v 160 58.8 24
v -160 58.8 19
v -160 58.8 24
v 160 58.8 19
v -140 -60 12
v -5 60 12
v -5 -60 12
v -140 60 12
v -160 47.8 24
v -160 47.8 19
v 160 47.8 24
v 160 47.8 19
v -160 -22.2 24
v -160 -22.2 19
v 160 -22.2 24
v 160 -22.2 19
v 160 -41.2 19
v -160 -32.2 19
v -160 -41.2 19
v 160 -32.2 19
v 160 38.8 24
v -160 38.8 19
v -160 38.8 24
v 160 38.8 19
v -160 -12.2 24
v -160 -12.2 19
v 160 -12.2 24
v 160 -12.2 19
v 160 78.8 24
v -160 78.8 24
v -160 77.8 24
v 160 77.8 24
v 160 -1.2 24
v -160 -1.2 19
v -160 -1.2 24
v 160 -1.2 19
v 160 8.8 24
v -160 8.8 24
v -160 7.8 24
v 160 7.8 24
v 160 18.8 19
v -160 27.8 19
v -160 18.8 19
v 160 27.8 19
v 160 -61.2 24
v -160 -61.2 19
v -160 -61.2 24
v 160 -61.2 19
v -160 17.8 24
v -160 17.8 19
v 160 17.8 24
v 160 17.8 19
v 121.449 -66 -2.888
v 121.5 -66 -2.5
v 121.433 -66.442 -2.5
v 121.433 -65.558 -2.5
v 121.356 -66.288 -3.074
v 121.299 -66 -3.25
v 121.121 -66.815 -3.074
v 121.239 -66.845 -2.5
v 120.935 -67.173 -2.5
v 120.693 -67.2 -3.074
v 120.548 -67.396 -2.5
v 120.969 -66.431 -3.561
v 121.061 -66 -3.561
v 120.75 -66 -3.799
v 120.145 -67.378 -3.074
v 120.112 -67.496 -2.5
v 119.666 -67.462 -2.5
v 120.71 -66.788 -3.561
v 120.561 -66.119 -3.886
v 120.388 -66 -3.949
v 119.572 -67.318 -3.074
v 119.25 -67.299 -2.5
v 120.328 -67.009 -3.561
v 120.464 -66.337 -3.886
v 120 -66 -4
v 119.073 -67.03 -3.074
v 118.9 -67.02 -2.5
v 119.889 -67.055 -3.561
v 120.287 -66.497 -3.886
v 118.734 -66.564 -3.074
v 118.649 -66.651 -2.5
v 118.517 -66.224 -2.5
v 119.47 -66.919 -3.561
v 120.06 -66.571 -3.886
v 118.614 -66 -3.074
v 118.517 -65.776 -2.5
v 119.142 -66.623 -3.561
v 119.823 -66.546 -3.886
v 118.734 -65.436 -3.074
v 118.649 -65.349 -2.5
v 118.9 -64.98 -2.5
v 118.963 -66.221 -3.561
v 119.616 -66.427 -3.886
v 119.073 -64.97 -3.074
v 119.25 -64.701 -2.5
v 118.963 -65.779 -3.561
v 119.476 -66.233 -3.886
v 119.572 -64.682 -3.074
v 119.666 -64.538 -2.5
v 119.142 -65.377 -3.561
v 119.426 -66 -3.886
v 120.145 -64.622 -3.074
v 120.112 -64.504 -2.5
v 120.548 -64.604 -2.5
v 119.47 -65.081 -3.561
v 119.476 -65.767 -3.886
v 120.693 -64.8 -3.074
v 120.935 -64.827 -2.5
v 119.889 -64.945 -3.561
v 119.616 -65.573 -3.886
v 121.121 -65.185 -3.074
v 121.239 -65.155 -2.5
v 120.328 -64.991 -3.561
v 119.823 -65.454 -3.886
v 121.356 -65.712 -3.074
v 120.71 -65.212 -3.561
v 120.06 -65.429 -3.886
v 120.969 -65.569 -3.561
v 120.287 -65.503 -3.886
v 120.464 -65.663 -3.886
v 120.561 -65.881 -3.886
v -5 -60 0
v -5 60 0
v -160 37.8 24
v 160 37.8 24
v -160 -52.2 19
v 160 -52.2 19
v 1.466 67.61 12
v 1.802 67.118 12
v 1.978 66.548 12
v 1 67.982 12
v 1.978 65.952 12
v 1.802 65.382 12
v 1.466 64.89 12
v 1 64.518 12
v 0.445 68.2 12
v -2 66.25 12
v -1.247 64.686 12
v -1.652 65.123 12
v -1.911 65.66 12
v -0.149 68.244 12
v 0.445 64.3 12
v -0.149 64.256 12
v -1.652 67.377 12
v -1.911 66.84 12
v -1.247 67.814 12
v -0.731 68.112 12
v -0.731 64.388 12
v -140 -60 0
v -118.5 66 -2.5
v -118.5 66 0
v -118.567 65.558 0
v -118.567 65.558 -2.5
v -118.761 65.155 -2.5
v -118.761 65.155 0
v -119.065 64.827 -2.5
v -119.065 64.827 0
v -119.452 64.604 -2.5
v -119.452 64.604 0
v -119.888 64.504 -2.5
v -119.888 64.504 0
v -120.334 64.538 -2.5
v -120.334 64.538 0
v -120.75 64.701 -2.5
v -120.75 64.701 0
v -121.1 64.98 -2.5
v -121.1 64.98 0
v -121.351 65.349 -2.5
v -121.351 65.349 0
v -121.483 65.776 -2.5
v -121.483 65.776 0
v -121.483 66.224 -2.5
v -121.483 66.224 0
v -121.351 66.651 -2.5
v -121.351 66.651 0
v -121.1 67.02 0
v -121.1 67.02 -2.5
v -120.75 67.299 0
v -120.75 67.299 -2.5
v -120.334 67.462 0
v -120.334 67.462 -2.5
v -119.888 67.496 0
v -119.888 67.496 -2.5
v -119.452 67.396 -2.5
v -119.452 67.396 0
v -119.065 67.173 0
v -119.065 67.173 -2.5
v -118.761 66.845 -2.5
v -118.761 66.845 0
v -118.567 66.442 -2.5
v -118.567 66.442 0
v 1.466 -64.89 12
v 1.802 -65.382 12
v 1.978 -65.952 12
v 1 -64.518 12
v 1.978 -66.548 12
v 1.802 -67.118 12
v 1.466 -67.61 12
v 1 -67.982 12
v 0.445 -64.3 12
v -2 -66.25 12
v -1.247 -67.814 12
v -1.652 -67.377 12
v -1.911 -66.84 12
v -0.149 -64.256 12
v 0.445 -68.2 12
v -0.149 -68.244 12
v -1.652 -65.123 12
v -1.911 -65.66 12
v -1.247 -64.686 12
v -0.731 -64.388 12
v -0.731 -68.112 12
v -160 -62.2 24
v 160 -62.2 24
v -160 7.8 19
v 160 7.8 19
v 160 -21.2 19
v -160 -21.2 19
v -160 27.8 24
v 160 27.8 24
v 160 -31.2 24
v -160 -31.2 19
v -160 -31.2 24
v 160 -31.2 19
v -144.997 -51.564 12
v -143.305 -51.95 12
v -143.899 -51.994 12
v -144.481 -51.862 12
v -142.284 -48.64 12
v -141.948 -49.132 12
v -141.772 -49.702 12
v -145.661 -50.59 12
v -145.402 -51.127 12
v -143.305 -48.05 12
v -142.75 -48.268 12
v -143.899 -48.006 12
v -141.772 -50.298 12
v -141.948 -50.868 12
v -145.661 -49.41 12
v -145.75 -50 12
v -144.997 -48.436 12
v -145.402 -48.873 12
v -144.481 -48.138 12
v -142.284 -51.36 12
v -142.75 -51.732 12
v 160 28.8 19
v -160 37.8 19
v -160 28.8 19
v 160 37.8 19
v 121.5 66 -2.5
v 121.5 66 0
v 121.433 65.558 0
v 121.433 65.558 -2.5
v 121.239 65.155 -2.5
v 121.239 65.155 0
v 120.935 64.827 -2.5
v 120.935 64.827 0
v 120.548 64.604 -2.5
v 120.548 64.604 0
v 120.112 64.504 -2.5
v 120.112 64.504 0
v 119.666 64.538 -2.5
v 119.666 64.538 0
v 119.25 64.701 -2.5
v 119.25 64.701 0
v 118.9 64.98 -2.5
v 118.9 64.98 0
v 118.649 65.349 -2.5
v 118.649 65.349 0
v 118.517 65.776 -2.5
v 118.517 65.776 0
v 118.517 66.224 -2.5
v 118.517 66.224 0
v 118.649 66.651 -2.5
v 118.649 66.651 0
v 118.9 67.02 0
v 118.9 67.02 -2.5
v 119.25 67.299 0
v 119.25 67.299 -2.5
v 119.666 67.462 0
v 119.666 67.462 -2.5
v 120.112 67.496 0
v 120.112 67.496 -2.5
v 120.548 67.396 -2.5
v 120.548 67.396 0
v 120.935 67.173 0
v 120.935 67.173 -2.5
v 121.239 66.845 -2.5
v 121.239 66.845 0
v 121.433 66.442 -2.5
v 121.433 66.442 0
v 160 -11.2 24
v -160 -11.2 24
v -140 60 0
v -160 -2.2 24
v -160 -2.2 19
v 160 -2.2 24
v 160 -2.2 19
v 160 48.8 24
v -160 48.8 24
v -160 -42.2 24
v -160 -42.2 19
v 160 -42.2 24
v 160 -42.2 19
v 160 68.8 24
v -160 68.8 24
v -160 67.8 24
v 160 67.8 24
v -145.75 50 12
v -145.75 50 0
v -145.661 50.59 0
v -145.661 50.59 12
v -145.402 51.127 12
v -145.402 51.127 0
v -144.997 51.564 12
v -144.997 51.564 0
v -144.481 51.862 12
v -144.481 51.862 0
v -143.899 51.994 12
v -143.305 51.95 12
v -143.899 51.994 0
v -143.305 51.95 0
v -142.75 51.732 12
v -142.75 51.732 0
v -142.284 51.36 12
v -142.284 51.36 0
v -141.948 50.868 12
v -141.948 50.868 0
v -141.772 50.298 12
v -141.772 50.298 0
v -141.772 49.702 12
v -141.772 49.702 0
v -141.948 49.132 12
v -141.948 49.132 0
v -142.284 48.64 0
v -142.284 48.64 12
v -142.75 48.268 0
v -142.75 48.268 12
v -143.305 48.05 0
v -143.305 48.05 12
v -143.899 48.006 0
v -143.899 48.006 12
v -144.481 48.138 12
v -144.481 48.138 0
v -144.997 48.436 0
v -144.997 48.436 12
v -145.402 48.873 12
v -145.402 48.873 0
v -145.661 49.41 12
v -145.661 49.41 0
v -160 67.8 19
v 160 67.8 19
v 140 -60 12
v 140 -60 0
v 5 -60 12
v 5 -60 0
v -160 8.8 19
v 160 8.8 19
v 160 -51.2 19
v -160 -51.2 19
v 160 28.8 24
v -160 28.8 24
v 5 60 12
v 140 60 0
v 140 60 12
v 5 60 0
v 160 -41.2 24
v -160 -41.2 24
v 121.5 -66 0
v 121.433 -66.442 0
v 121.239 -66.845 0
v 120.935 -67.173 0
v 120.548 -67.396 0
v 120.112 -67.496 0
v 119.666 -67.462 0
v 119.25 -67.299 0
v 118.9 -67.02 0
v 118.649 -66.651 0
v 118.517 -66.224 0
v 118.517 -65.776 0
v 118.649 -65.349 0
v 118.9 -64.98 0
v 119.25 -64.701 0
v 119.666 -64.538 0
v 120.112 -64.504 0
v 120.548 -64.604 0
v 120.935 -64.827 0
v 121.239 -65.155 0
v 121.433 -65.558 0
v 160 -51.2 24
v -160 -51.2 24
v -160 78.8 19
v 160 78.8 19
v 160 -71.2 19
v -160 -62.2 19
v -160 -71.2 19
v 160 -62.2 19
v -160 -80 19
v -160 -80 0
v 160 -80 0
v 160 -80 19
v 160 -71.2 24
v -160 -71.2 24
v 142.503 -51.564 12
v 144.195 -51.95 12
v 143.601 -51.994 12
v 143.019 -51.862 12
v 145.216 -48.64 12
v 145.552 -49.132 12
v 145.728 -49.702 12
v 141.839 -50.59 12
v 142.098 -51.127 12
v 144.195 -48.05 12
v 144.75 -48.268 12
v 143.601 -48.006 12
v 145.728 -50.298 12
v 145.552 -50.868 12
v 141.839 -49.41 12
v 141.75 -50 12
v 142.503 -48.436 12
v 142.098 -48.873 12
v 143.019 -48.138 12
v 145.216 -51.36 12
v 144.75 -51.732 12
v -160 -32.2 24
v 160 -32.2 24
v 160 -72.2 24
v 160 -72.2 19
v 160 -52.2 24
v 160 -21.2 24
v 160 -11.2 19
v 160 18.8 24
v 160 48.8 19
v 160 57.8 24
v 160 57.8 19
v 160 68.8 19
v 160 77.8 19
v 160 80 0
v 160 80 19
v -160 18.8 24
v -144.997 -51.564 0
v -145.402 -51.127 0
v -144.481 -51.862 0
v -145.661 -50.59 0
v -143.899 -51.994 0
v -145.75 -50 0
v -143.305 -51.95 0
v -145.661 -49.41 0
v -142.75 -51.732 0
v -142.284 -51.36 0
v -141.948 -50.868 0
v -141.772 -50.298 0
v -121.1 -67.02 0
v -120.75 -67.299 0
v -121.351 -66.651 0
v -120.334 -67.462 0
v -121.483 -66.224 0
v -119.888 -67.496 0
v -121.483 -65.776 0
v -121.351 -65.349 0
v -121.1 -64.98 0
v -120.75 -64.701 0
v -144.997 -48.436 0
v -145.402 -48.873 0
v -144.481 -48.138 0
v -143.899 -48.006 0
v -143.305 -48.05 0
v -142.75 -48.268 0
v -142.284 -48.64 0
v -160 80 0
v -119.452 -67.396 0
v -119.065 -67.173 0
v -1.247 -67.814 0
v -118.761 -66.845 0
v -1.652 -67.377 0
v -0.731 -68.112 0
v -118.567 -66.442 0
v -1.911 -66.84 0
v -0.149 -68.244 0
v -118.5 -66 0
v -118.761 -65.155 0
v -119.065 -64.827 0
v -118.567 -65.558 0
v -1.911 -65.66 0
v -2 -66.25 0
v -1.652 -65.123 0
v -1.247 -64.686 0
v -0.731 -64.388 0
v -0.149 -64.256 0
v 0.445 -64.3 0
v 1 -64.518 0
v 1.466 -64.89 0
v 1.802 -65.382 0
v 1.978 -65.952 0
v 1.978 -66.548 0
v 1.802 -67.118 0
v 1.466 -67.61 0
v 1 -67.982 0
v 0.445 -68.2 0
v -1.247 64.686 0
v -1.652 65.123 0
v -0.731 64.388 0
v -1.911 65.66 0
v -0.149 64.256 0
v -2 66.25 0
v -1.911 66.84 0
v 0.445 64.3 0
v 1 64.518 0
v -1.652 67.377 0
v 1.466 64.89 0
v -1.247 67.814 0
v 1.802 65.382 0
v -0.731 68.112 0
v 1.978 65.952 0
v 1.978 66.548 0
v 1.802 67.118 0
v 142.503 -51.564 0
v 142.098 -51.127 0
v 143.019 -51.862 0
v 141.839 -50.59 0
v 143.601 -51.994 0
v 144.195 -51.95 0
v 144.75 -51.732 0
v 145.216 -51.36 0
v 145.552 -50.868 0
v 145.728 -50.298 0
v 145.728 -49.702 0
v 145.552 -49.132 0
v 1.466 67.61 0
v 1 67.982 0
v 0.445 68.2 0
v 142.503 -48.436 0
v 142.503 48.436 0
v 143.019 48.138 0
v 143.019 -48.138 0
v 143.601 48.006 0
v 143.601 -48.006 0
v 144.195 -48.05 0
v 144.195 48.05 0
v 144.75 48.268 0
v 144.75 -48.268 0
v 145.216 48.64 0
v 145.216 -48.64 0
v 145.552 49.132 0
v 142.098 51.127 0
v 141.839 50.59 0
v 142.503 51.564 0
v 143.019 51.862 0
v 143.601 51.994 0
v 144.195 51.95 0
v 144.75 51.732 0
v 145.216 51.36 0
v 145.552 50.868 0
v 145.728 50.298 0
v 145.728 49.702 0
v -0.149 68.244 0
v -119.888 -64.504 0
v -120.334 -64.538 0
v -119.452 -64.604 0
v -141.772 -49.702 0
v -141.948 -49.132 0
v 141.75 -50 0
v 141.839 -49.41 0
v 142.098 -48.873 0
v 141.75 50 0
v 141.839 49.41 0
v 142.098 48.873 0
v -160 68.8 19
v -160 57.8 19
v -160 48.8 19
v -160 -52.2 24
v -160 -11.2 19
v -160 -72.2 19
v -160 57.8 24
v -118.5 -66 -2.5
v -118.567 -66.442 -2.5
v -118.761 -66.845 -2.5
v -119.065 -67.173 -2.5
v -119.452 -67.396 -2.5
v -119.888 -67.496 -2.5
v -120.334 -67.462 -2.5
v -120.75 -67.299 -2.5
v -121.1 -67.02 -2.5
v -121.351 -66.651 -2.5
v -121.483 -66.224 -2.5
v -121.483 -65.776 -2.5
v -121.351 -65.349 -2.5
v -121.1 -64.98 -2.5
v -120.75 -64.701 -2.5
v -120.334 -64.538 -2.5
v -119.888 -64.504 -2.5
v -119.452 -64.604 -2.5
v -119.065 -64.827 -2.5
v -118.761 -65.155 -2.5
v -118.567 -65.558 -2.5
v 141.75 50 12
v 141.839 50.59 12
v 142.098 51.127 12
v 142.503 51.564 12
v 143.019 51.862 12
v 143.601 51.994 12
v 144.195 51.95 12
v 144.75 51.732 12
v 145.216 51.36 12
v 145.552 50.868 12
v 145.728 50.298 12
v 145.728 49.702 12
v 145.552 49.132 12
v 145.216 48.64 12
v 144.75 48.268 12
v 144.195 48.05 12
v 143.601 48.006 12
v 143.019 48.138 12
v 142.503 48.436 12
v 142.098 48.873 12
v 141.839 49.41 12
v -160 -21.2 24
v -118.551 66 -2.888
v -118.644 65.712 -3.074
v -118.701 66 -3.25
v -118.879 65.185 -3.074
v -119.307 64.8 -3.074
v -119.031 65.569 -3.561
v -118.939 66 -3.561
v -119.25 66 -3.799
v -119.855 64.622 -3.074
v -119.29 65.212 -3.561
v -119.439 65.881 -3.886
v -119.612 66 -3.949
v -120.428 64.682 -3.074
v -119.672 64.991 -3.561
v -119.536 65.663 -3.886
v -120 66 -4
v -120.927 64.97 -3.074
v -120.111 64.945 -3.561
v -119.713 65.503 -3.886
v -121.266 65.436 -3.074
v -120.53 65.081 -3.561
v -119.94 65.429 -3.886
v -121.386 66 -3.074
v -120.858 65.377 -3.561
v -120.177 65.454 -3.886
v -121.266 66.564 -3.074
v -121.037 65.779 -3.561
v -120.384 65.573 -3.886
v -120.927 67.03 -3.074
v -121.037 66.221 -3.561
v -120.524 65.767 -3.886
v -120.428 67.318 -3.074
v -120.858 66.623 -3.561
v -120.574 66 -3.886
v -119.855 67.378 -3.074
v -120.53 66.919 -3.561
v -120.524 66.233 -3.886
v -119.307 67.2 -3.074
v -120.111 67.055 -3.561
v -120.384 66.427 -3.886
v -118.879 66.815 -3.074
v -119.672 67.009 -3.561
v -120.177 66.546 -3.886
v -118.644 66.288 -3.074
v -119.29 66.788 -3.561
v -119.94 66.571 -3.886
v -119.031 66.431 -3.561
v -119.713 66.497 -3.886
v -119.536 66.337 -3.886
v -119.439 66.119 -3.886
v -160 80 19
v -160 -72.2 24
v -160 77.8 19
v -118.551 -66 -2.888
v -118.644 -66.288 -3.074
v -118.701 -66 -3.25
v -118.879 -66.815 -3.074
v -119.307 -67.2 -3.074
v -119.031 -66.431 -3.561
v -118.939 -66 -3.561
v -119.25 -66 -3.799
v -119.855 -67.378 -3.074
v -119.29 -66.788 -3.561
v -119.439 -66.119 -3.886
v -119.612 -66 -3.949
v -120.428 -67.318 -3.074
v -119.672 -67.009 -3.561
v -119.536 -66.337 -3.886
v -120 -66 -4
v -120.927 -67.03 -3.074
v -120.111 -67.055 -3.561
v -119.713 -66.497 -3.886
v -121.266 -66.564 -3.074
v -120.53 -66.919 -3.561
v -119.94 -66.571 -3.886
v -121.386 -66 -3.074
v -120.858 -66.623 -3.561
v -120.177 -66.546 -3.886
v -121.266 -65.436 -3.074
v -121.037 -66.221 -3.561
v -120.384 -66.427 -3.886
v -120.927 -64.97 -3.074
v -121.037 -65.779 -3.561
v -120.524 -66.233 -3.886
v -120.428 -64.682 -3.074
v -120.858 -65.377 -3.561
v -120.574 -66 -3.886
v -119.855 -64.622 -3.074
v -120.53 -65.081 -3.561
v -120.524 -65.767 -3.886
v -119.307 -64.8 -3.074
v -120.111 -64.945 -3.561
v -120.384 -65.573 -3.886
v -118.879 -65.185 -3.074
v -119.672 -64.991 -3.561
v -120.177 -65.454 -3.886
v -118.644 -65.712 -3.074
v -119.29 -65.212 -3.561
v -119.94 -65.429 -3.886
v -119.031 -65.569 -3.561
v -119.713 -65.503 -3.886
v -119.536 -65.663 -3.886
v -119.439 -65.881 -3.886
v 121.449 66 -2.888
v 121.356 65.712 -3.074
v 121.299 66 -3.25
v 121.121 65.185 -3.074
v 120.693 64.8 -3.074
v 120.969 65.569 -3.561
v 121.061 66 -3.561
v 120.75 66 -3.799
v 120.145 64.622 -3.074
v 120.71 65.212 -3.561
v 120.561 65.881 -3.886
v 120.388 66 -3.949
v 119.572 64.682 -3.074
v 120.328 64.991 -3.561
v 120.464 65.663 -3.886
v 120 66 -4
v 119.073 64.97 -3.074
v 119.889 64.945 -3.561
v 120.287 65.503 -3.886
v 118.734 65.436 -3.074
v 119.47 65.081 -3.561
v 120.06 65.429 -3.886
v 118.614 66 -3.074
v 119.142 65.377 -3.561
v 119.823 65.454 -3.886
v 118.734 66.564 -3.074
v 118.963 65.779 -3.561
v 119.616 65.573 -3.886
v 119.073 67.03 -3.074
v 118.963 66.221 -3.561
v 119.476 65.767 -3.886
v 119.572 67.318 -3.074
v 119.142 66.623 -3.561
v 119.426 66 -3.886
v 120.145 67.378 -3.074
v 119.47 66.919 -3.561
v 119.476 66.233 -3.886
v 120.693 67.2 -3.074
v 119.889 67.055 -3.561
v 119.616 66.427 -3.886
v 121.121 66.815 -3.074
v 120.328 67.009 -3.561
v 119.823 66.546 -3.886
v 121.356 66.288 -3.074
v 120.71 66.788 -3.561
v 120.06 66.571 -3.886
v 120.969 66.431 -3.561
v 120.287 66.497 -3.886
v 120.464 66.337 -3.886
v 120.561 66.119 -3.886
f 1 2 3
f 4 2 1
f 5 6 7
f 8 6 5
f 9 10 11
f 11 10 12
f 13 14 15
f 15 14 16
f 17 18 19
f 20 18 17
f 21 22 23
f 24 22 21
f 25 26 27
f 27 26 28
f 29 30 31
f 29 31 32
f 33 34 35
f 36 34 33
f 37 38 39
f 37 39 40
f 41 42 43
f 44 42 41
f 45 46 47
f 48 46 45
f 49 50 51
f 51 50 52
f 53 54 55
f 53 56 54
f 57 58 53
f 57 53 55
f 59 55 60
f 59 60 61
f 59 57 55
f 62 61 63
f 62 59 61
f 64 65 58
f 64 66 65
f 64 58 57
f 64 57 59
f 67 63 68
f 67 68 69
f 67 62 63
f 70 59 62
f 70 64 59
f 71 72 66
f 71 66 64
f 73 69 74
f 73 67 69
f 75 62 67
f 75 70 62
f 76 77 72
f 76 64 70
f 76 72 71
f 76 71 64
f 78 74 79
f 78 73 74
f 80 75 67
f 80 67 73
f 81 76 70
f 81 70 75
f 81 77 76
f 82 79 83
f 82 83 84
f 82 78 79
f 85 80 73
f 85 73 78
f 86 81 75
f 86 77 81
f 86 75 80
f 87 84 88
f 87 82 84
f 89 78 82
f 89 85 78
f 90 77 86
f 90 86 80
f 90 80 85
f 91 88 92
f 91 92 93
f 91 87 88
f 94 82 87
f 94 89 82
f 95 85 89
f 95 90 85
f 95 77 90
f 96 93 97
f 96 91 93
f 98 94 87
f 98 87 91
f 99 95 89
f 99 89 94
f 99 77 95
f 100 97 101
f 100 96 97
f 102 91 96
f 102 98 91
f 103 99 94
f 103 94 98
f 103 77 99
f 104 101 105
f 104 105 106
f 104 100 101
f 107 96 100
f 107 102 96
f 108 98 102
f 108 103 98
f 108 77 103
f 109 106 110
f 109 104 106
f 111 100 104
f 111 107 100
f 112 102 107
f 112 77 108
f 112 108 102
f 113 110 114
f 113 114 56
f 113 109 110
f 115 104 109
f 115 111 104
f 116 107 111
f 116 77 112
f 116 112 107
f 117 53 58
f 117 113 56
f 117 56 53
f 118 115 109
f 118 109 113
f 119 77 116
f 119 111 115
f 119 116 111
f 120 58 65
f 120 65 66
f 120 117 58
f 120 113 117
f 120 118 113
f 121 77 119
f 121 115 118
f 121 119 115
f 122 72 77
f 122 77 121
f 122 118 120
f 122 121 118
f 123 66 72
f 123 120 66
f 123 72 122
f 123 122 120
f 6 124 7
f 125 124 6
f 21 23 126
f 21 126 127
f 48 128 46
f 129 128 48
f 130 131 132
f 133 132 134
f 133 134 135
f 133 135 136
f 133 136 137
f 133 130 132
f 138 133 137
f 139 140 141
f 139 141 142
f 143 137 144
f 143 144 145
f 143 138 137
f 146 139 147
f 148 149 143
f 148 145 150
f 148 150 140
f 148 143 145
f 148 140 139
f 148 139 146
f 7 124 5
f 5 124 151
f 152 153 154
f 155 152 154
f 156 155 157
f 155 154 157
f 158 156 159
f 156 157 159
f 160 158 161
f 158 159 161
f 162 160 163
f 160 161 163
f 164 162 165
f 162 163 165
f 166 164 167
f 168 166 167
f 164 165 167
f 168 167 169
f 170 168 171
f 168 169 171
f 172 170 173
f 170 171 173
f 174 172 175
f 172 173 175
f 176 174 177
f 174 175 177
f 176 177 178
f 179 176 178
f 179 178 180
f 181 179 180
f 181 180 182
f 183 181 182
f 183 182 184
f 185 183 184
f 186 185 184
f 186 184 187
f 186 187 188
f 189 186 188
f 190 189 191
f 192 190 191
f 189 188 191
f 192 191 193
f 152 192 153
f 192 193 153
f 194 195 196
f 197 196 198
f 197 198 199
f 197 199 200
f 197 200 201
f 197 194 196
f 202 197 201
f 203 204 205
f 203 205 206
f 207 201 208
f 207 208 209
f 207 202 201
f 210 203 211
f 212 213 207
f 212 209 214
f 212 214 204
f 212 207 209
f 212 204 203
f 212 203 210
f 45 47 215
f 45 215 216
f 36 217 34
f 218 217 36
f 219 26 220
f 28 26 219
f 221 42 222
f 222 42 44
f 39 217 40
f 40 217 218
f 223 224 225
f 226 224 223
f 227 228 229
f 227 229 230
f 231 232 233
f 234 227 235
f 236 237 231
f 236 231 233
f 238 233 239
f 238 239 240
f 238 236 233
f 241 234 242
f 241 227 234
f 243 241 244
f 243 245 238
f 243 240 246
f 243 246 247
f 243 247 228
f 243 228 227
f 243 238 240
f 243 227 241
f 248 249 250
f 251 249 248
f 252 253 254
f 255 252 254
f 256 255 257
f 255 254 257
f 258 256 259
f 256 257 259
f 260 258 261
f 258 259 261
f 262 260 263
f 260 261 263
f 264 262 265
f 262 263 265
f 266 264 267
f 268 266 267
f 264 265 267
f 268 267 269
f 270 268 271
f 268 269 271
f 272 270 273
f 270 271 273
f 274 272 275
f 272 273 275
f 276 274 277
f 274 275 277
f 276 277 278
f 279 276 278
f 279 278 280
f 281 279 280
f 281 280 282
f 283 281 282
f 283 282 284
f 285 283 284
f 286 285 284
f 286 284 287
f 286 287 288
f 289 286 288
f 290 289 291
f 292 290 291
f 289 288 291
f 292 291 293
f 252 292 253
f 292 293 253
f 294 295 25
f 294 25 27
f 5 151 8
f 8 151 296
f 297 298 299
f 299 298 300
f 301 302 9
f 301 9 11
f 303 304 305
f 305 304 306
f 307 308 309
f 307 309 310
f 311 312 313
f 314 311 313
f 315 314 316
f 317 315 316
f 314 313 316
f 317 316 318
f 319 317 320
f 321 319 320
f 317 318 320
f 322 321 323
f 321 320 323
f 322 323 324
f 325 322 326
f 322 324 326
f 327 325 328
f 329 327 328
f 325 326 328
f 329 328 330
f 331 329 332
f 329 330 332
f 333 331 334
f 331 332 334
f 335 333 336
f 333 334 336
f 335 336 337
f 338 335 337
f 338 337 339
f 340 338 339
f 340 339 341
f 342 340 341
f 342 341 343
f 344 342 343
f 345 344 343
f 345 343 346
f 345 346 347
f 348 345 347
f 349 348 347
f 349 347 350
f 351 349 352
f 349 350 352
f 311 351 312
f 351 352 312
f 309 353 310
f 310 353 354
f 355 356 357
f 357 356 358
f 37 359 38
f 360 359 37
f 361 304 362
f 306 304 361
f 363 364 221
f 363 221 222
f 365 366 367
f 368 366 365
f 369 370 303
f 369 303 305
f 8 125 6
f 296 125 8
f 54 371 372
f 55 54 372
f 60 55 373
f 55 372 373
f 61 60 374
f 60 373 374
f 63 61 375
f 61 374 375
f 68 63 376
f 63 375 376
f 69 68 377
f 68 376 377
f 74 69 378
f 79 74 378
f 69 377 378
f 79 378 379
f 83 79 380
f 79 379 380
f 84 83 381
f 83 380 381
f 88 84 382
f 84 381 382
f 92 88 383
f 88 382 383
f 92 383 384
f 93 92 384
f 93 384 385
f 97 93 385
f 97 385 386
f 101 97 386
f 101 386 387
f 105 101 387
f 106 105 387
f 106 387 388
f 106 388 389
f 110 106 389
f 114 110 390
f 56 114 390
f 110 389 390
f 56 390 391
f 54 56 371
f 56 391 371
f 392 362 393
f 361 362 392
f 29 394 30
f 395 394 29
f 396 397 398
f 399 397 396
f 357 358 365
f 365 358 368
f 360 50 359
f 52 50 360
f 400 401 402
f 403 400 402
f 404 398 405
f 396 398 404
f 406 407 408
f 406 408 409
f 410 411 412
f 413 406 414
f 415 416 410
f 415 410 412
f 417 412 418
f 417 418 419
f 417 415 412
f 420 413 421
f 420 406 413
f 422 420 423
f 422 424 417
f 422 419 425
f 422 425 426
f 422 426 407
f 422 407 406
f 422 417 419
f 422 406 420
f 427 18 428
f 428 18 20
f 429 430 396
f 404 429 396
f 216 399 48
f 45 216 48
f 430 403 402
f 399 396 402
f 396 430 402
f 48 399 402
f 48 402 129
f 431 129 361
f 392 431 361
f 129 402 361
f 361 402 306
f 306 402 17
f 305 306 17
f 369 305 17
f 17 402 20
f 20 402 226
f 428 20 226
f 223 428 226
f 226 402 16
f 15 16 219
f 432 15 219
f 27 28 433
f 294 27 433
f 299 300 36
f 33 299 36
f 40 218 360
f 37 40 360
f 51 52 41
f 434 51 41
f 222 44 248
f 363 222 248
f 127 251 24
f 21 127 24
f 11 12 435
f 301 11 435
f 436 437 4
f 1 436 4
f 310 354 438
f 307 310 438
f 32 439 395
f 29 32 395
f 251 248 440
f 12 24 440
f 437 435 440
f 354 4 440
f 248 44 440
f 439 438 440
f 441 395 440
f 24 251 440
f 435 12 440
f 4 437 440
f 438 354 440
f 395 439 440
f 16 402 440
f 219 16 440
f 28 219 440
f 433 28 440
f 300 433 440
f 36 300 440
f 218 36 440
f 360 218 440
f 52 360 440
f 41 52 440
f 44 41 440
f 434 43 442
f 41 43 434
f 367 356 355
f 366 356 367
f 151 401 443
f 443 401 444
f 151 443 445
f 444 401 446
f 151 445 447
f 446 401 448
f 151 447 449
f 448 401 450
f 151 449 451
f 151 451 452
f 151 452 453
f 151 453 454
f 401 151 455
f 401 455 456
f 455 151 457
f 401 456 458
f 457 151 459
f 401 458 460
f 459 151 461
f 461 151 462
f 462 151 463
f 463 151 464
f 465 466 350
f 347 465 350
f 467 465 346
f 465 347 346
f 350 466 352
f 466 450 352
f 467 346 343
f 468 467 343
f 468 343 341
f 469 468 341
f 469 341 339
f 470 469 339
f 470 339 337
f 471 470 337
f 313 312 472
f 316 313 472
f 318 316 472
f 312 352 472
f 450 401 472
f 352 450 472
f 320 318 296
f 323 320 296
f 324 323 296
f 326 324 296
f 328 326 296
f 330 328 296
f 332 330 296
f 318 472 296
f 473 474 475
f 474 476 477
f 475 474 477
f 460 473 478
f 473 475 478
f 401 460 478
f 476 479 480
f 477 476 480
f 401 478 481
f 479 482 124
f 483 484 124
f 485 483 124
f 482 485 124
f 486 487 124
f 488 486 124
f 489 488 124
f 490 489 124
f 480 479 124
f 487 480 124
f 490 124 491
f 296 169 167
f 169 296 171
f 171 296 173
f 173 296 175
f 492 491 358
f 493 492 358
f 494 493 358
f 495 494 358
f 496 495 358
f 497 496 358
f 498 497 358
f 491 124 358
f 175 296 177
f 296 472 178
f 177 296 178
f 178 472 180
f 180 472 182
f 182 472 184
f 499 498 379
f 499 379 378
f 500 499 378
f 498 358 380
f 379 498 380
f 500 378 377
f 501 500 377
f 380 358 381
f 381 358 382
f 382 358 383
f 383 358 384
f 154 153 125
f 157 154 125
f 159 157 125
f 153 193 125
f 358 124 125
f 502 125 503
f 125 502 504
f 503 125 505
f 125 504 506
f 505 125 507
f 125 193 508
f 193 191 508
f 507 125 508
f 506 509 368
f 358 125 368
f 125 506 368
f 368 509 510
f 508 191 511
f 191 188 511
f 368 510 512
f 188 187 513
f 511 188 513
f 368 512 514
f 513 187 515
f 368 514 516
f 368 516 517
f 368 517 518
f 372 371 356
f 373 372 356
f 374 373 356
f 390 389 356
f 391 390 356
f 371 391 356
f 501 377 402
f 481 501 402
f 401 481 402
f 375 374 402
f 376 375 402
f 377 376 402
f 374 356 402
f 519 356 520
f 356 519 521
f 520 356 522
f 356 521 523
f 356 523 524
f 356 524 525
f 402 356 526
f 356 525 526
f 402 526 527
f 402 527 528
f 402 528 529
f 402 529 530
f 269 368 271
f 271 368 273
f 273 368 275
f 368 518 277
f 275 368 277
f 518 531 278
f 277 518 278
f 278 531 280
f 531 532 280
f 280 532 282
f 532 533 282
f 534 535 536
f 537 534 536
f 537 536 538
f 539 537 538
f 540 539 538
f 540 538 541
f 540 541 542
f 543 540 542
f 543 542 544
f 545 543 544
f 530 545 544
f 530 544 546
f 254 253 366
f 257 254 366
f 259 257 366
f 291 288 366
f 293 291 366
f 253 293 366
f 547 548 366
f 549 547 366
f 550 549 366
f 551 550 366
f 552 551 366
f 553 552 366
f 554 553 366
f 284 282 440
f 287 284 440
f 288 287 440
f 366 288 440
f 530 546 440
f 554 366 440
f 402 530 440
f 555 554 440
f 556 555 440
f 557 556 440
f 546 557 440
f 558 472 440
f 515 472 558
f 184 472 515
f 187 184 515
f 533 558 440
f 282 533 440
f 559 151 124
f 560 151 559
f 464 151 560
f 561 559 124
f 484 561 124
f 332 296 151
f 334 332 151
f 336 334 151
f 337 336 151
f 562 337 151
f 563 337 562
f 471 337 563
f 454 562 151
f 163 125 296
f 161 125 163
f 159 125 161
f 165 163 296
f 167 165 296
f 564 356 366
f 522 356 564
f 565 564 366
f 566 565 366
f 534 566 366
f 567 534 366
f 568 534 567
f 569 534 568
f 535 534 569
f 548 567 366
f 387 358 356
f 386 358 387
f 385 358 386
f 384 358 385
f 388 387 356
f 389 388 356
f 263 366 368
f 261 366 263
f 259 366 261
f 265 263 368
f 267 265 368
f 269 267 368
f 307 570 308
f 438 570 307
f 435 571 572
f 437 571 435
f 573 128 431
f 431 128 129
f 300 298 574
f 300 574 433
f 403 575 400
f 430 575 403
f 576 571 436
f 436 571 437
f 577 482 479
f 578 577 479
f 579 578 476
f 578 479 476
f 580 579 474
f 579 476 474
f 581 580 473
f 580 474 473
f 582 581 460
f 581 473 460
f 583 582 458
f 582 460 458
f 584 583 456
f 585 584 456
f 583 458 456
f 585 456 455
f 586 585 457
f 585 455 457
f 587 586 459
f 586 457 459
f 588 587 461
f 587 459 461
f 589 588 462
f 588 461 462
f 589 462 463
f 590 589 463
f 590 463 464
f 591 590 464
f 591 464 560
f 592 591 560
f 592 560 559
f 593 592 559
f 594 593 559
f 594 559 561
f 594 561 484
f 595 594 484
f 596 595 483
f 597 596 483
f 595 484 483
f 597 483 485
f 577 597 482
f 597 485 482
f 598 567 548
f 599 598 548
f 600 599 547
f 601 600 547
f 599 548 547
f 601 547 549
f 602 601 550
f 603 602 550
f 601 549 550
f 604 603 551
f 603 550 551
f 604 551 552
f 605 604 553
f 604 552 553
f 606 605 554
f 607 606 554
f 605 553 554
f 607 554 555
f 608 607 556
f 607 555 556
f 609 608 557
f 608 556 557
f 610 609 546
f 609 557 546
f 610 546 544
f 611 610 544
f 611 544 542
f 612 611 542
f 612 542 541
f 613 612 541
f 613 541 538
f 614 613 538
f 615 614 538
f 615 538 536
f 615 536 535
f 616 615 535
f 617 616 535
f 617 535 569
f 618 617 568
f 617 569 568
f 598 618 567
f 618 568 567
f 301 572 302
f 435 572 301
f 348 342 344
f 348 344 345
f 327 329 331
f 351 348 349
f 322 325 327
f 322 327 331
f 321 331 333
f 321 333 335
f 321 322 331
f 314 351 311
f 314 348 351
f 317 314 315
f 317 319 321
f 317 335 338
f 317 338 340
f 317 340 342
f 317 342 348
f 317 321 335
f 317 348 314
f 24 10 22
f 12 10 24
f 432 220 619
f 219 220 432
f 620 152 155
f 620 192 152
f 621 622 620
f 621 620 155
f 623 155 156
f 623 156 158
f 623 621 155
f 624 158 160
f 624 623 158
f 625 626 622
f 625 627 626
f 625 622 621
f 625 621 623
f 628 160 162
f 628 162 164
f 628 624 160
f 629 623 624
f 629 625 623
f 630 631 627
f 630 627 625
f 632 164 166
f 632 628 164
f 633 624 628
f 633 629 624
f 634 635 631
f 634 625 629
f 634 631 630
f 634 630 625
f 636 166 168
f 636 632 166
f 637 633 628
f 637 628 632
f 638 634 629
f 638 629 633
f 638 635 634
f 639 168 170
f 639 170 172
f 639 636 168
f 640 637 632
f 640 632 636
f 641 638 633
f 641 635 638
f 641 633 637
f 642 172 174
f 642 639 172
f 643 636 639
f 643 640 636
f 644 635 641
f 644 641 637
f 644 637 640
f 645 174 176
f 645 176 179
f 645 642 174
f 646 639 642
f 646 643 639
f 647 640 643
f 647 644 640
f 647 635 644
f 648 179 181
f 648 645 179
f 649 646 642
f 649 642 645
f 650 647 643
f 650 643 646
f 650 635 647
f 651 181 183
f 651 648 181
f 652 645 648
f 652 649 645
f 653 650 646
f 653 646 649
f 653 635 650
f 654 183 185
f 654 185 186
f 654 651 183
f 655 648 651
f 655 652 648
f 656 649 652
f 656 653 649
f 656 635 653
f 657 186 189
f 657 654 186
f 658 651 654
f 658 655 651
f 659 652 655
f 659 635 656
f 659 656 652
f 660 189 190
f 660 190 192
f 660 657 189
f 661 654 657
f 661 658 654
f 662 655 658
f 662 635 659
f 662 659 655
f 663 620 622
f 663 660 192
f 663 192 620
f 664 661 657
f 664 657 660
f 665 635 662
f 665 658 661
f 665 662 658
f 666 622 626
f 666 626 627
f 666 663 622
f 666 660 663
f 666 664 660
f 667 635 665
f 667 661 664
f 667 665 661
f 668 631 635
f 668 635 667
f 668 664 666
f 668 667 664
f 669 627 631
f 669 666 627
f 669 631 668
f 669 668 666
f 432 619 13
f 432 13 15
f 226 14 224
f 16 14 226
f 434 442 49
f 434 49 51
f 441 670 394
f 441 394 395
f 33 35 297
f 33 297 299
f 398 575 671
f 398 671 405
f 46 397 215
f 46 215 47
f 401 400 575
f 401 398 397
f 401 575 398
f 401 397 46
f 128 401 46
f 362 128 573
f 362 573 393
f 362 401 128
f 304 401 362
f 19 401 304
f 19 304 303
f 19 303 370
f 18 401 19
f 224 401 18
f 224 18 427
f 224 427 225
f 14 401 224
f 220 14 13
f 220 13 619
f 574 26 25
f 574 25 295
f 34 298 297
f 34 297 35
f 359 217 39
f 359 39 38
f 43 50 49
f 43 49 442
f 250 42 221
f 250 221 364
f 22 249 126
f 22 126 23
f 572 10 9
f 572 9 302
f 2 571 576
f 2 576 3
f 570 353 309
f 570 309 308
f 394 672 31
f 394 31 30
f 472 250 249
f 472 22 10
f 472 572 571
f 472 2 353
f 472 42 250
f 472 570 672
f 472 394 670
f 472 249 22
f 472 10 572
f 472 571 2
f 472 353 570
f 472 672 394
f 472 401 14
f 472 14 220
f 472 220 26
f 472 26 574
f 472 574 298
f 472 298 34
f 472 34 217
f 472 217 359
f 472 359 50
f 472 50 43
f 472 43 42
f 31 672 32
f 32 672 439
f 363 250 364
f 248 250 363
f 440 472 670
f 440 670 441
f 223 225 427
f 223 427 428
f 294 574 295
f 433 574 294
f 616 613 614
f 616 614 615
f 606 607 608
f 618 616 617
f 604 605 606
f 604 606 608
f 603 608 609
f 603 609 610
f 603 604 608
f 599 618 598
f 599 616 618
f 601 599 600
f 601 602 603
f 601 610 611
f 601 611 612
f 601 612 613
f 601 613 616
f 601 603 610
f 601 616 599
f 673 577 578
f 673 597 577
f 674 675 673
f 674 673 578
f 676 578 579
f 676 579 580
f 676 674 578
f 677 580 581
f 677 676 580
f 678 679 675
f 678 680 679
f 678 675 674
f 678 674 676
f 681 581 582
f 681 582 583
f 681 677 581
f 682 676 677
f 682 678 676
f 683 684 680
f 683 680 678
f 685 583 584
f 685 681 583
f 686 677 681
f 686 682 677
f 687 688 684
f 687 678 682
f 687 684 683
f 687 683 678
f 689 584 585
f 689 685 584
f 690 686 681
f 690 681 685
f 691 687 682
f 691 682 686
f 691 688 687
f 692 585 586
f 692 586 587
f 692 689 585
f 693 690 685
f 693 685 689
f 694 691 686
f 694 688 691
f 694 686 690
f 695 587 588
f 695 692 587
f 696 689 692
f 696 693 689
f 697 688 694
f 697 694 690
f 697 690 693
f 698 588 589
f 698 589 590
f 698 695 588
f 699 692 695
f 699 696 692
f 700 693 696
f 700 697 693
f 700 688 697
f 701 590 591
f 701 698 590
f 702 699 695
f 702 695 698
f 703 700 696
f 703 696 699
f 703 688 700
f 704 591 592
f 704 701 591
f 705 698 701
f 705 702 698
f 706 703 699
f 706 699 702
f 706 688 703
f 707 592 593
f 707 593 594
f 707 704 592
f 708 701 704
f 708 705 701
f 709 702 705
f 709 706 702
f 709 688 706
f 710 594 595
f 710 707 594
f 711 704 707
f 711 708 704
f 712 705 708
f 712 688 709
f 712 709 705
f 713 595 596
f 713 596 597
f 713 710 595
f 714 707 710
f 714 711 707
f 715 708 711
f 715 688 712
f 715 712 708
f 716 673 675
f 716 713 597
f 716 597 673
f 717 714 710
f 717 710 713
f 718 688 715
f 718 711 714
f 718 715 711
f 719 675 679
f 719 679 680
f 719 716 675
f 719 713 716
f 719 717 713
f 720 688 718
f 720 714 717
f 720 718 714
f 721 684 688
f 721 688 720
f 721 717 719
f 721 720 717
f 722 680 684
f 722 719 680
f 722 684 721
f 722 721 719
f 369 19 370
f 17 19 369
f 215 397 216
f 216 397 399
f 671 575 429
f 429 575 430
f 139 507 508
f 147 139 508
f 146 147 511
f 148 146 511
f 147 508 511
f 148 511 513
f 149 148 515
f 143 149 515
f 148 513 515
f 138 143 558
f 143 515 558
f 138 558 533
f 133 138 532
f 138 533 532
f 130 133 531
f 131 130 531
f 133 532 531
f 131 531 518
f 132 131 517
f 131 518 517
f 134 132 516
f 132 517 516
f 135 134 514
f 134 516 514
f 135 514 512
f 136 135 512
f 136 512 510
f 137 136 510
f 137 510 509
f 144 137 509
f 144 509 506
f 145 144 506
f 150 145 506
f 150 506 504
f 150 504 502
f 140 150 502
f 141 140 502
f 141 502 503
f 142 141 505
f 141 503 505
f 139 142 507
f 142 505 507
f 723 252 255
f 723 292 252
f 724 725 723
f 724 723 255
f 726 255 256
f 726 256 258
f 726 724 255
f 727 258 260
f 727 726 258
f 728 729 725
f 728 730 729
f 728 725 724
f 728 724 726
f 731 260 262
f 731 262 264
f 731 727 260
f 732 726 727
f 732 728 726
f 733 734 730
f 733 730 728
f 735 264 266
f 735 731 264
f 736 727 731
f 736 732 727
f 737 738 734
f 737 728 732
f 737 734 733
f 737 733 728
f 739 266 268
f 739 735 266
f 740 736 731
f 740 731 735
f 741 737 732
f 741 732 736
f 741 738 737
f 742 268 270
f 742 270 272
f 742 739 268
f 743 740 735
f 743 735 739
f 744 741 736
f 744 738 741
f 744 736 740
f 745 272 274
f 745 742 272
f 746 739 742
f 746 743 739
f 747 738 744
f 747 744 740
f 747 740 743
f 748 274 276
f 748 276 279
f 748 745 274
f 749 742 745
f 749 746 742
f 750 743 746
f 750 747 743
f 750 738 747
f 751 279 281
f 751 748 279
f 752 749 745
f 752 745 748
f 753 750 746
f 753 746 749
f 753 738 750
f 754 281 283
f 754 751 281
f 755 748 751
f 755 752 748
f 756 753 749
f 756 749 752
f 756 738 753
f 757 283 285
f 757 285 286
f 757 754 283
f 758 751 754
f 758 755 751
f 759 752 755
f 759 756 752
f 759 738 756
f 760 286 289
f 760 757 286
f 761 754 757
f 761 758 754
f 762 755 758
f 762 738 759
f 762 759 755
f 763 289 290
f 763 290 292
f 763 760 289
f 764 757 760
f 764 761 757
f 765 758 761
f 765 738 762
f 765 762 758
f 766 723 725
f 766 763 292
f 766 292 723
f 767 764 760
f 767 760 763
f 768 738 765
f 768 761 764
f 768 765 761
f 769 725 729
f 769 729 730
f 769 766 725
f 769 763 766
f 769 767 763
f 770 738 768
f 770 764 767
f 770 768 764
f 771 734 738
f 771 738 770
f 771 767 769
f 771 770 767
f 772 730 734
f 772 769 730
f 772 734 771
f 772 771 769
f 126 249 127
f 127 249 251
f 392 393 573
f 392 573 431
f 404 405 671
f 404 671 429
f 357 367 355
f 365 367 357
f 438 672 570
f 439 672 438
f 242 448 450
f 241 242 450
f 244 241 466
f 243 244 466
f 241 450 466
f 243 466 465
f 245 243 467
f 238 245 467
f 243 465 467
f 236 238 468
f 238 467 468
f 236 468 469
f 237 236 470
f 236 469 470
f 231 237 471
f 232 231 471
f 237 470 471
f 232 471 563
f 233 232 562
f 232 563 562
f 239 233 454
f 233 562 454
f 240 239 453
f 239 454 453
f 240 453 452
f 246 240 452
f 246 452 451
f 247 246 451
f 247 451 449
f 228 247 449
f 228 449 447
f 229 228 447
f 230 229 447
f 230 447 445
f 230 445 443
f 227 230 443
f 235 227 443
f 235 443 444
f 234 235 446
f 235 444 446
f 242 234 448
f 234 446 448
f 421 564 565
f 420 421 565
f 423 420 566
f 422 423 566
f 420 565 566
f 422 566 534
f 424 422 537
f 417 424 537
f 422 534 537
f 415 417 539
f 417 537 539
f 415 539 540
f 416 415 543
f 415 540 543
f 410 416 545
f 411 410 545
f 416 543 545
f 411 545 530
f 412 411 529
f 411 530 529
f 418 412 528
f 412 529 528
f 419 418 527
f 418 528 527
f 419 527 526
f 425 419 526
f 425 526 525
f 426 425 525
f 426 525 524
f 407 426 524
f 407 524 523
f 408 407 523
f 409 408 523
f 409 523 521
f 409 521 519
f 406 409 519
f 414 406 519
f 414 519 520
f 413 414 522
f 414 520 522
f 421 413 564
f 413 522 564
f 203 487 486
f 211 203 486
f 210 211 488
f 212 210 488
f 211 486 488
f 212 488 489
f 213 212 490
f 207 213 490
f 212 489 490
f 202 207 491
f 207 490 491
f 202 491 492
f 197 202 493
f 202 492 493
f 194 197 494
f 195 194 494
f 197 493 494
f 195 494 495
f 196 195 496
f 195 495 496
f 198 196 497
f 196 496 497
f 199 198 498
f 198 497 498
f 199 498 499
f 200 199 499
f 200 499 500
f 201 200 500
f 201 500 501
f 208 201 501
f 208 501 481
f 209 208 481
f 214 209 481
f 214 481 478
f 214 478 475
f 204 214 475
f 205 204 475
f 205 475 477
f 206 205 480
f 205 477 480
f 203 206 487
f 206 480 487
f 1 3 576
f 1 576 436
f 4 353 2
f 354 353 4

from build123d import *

# Parameters (mm, degrees)
SKETCH1_W           = 320
SKETCH1_H           = 160
BOSS_EXTRUDE1_DEPTH = 19
SKETCH4_W           = 320
SKETCH4_H           = 1
BOSS_EXTRUDE4_DEPTH = 5
LPATTERN2_COUNT     = 16
LPATTERN2_PITCH     = 10
SKETCH5_W           = 135
SKETCH5_H           = 120
CUT_EXTRUDE1_DEPTH  = 12
SKETCH6_R           = 2
CUT_EXTRUDE2_DEPTH  = 12
SKETCH7_R           = 1.5
BOSS_EXTRUDE5_DEPTH = 4
FILLET2_R           = 1.5


with BuildPart() as part:
    # Sketch1 → Boss-Extrude1 (new body)
    with BuildSketch(Plane.XY):
        Rectangle(SKETCH1_W, SKETCH1_H)
    extrude(amount=BOSS_EXTRUDE1_DEPTH)

    # Sketch4 → Boss-Extrude4 (add)
    with BuildSketch(Plane.XY.offset(19)):
        with Locations((0, 78.3)):
            Rectangle(SKETCH4_W, SKETCH4_H)
    boss_extrude4 = extrude(amount=BOSS_EXTRUDE4_DEPTH)

    # LPattern2: Boss-Extrude4 ×16
    with Locations(*[(0, -i * LPATTERN2_PITCH, 0) for i in range(1, LPATTERN2_COUNT)]):
        add(boss_extrude4)

    # Sketch5 → Cut-Extrude1 (cut)
    with BuildSketch(Plane(origin=(0, 0, 0), x_dir=(-1, 0, 0), z_dir=(0, 0, -1))):
        with Locations((-72.5, 0)):
            Rectangle(SKETCH5_W, SKETCH5_H)
        with Locations((72.5, 0)):
            Rectangle(SKETCH5_W, SKETCH5_H)
    extrude(amount=-CUT_EXTRUDE1_DEPTH, mode=Mode.SUBTRACT)

    # Sketch6 → Cut-Extrude2 (cut)
    with BuildSketch(Plane(origin=(0, 0, 0), x_dir=(-1, 0, 0), z_dir=(0, 0, -1))):
        with Locations((-143.75, 50)):
            Circle(SKETCH6_R)
        with Locations((-143.75, -50)):
            Circle(SKETCH6_R)
        with Locations((0, 66.25)):
            Circle(SKETCH6_R)
        with Locations((143.75, 50)):
            Circle(SKETCH6_R)
        with Locations((143.75, -50)):
            Circle(SKETCH6_R)
        with Locations((0, -66.25)):
            Circle(SKETCH6_R)
    extrude(amount=-CUT_EXTRUDE2_DEPTH, mode=Mode.SUBTRACT)

    # Sketch7 → Boss-Extrude5 (add)
    with BuildSketch(Plane(origin=(0, 0, 0), x_dir=(-1, 0, 0), z_dir=(0, 0, -1))):
        with Locations(Location((-120, 66, 0), (0, 0, 180))):
            Circle(SKETCH7_R)
        with Locations(Location((120, 66, 0), (0, 0, 180))):
            Circle(SKETCH7_R)
        with Locations(Location((120, -66, 0), (0, 0, 180))):
            Circle(SKETCH7_R)
        with Locations(Location((-120, -66, 0), (0, 0, 180))):
            Circle(SKETCH7_R)
    extrude(amount=BOSS_EXTRUDE5_DEPTH)

    # Fillet2
    fillet2_edges = [part.edges().sort_by_distance(p)[0] for p in [
        (118.5, 66, -4),
        (-121.5, 66, -4),
        (-121.5, -66, -4),
        (118.5, -66, -4),
    ]]
    fillet(fillet2_edges, radius=FILLET2_R)


solid = part.part
